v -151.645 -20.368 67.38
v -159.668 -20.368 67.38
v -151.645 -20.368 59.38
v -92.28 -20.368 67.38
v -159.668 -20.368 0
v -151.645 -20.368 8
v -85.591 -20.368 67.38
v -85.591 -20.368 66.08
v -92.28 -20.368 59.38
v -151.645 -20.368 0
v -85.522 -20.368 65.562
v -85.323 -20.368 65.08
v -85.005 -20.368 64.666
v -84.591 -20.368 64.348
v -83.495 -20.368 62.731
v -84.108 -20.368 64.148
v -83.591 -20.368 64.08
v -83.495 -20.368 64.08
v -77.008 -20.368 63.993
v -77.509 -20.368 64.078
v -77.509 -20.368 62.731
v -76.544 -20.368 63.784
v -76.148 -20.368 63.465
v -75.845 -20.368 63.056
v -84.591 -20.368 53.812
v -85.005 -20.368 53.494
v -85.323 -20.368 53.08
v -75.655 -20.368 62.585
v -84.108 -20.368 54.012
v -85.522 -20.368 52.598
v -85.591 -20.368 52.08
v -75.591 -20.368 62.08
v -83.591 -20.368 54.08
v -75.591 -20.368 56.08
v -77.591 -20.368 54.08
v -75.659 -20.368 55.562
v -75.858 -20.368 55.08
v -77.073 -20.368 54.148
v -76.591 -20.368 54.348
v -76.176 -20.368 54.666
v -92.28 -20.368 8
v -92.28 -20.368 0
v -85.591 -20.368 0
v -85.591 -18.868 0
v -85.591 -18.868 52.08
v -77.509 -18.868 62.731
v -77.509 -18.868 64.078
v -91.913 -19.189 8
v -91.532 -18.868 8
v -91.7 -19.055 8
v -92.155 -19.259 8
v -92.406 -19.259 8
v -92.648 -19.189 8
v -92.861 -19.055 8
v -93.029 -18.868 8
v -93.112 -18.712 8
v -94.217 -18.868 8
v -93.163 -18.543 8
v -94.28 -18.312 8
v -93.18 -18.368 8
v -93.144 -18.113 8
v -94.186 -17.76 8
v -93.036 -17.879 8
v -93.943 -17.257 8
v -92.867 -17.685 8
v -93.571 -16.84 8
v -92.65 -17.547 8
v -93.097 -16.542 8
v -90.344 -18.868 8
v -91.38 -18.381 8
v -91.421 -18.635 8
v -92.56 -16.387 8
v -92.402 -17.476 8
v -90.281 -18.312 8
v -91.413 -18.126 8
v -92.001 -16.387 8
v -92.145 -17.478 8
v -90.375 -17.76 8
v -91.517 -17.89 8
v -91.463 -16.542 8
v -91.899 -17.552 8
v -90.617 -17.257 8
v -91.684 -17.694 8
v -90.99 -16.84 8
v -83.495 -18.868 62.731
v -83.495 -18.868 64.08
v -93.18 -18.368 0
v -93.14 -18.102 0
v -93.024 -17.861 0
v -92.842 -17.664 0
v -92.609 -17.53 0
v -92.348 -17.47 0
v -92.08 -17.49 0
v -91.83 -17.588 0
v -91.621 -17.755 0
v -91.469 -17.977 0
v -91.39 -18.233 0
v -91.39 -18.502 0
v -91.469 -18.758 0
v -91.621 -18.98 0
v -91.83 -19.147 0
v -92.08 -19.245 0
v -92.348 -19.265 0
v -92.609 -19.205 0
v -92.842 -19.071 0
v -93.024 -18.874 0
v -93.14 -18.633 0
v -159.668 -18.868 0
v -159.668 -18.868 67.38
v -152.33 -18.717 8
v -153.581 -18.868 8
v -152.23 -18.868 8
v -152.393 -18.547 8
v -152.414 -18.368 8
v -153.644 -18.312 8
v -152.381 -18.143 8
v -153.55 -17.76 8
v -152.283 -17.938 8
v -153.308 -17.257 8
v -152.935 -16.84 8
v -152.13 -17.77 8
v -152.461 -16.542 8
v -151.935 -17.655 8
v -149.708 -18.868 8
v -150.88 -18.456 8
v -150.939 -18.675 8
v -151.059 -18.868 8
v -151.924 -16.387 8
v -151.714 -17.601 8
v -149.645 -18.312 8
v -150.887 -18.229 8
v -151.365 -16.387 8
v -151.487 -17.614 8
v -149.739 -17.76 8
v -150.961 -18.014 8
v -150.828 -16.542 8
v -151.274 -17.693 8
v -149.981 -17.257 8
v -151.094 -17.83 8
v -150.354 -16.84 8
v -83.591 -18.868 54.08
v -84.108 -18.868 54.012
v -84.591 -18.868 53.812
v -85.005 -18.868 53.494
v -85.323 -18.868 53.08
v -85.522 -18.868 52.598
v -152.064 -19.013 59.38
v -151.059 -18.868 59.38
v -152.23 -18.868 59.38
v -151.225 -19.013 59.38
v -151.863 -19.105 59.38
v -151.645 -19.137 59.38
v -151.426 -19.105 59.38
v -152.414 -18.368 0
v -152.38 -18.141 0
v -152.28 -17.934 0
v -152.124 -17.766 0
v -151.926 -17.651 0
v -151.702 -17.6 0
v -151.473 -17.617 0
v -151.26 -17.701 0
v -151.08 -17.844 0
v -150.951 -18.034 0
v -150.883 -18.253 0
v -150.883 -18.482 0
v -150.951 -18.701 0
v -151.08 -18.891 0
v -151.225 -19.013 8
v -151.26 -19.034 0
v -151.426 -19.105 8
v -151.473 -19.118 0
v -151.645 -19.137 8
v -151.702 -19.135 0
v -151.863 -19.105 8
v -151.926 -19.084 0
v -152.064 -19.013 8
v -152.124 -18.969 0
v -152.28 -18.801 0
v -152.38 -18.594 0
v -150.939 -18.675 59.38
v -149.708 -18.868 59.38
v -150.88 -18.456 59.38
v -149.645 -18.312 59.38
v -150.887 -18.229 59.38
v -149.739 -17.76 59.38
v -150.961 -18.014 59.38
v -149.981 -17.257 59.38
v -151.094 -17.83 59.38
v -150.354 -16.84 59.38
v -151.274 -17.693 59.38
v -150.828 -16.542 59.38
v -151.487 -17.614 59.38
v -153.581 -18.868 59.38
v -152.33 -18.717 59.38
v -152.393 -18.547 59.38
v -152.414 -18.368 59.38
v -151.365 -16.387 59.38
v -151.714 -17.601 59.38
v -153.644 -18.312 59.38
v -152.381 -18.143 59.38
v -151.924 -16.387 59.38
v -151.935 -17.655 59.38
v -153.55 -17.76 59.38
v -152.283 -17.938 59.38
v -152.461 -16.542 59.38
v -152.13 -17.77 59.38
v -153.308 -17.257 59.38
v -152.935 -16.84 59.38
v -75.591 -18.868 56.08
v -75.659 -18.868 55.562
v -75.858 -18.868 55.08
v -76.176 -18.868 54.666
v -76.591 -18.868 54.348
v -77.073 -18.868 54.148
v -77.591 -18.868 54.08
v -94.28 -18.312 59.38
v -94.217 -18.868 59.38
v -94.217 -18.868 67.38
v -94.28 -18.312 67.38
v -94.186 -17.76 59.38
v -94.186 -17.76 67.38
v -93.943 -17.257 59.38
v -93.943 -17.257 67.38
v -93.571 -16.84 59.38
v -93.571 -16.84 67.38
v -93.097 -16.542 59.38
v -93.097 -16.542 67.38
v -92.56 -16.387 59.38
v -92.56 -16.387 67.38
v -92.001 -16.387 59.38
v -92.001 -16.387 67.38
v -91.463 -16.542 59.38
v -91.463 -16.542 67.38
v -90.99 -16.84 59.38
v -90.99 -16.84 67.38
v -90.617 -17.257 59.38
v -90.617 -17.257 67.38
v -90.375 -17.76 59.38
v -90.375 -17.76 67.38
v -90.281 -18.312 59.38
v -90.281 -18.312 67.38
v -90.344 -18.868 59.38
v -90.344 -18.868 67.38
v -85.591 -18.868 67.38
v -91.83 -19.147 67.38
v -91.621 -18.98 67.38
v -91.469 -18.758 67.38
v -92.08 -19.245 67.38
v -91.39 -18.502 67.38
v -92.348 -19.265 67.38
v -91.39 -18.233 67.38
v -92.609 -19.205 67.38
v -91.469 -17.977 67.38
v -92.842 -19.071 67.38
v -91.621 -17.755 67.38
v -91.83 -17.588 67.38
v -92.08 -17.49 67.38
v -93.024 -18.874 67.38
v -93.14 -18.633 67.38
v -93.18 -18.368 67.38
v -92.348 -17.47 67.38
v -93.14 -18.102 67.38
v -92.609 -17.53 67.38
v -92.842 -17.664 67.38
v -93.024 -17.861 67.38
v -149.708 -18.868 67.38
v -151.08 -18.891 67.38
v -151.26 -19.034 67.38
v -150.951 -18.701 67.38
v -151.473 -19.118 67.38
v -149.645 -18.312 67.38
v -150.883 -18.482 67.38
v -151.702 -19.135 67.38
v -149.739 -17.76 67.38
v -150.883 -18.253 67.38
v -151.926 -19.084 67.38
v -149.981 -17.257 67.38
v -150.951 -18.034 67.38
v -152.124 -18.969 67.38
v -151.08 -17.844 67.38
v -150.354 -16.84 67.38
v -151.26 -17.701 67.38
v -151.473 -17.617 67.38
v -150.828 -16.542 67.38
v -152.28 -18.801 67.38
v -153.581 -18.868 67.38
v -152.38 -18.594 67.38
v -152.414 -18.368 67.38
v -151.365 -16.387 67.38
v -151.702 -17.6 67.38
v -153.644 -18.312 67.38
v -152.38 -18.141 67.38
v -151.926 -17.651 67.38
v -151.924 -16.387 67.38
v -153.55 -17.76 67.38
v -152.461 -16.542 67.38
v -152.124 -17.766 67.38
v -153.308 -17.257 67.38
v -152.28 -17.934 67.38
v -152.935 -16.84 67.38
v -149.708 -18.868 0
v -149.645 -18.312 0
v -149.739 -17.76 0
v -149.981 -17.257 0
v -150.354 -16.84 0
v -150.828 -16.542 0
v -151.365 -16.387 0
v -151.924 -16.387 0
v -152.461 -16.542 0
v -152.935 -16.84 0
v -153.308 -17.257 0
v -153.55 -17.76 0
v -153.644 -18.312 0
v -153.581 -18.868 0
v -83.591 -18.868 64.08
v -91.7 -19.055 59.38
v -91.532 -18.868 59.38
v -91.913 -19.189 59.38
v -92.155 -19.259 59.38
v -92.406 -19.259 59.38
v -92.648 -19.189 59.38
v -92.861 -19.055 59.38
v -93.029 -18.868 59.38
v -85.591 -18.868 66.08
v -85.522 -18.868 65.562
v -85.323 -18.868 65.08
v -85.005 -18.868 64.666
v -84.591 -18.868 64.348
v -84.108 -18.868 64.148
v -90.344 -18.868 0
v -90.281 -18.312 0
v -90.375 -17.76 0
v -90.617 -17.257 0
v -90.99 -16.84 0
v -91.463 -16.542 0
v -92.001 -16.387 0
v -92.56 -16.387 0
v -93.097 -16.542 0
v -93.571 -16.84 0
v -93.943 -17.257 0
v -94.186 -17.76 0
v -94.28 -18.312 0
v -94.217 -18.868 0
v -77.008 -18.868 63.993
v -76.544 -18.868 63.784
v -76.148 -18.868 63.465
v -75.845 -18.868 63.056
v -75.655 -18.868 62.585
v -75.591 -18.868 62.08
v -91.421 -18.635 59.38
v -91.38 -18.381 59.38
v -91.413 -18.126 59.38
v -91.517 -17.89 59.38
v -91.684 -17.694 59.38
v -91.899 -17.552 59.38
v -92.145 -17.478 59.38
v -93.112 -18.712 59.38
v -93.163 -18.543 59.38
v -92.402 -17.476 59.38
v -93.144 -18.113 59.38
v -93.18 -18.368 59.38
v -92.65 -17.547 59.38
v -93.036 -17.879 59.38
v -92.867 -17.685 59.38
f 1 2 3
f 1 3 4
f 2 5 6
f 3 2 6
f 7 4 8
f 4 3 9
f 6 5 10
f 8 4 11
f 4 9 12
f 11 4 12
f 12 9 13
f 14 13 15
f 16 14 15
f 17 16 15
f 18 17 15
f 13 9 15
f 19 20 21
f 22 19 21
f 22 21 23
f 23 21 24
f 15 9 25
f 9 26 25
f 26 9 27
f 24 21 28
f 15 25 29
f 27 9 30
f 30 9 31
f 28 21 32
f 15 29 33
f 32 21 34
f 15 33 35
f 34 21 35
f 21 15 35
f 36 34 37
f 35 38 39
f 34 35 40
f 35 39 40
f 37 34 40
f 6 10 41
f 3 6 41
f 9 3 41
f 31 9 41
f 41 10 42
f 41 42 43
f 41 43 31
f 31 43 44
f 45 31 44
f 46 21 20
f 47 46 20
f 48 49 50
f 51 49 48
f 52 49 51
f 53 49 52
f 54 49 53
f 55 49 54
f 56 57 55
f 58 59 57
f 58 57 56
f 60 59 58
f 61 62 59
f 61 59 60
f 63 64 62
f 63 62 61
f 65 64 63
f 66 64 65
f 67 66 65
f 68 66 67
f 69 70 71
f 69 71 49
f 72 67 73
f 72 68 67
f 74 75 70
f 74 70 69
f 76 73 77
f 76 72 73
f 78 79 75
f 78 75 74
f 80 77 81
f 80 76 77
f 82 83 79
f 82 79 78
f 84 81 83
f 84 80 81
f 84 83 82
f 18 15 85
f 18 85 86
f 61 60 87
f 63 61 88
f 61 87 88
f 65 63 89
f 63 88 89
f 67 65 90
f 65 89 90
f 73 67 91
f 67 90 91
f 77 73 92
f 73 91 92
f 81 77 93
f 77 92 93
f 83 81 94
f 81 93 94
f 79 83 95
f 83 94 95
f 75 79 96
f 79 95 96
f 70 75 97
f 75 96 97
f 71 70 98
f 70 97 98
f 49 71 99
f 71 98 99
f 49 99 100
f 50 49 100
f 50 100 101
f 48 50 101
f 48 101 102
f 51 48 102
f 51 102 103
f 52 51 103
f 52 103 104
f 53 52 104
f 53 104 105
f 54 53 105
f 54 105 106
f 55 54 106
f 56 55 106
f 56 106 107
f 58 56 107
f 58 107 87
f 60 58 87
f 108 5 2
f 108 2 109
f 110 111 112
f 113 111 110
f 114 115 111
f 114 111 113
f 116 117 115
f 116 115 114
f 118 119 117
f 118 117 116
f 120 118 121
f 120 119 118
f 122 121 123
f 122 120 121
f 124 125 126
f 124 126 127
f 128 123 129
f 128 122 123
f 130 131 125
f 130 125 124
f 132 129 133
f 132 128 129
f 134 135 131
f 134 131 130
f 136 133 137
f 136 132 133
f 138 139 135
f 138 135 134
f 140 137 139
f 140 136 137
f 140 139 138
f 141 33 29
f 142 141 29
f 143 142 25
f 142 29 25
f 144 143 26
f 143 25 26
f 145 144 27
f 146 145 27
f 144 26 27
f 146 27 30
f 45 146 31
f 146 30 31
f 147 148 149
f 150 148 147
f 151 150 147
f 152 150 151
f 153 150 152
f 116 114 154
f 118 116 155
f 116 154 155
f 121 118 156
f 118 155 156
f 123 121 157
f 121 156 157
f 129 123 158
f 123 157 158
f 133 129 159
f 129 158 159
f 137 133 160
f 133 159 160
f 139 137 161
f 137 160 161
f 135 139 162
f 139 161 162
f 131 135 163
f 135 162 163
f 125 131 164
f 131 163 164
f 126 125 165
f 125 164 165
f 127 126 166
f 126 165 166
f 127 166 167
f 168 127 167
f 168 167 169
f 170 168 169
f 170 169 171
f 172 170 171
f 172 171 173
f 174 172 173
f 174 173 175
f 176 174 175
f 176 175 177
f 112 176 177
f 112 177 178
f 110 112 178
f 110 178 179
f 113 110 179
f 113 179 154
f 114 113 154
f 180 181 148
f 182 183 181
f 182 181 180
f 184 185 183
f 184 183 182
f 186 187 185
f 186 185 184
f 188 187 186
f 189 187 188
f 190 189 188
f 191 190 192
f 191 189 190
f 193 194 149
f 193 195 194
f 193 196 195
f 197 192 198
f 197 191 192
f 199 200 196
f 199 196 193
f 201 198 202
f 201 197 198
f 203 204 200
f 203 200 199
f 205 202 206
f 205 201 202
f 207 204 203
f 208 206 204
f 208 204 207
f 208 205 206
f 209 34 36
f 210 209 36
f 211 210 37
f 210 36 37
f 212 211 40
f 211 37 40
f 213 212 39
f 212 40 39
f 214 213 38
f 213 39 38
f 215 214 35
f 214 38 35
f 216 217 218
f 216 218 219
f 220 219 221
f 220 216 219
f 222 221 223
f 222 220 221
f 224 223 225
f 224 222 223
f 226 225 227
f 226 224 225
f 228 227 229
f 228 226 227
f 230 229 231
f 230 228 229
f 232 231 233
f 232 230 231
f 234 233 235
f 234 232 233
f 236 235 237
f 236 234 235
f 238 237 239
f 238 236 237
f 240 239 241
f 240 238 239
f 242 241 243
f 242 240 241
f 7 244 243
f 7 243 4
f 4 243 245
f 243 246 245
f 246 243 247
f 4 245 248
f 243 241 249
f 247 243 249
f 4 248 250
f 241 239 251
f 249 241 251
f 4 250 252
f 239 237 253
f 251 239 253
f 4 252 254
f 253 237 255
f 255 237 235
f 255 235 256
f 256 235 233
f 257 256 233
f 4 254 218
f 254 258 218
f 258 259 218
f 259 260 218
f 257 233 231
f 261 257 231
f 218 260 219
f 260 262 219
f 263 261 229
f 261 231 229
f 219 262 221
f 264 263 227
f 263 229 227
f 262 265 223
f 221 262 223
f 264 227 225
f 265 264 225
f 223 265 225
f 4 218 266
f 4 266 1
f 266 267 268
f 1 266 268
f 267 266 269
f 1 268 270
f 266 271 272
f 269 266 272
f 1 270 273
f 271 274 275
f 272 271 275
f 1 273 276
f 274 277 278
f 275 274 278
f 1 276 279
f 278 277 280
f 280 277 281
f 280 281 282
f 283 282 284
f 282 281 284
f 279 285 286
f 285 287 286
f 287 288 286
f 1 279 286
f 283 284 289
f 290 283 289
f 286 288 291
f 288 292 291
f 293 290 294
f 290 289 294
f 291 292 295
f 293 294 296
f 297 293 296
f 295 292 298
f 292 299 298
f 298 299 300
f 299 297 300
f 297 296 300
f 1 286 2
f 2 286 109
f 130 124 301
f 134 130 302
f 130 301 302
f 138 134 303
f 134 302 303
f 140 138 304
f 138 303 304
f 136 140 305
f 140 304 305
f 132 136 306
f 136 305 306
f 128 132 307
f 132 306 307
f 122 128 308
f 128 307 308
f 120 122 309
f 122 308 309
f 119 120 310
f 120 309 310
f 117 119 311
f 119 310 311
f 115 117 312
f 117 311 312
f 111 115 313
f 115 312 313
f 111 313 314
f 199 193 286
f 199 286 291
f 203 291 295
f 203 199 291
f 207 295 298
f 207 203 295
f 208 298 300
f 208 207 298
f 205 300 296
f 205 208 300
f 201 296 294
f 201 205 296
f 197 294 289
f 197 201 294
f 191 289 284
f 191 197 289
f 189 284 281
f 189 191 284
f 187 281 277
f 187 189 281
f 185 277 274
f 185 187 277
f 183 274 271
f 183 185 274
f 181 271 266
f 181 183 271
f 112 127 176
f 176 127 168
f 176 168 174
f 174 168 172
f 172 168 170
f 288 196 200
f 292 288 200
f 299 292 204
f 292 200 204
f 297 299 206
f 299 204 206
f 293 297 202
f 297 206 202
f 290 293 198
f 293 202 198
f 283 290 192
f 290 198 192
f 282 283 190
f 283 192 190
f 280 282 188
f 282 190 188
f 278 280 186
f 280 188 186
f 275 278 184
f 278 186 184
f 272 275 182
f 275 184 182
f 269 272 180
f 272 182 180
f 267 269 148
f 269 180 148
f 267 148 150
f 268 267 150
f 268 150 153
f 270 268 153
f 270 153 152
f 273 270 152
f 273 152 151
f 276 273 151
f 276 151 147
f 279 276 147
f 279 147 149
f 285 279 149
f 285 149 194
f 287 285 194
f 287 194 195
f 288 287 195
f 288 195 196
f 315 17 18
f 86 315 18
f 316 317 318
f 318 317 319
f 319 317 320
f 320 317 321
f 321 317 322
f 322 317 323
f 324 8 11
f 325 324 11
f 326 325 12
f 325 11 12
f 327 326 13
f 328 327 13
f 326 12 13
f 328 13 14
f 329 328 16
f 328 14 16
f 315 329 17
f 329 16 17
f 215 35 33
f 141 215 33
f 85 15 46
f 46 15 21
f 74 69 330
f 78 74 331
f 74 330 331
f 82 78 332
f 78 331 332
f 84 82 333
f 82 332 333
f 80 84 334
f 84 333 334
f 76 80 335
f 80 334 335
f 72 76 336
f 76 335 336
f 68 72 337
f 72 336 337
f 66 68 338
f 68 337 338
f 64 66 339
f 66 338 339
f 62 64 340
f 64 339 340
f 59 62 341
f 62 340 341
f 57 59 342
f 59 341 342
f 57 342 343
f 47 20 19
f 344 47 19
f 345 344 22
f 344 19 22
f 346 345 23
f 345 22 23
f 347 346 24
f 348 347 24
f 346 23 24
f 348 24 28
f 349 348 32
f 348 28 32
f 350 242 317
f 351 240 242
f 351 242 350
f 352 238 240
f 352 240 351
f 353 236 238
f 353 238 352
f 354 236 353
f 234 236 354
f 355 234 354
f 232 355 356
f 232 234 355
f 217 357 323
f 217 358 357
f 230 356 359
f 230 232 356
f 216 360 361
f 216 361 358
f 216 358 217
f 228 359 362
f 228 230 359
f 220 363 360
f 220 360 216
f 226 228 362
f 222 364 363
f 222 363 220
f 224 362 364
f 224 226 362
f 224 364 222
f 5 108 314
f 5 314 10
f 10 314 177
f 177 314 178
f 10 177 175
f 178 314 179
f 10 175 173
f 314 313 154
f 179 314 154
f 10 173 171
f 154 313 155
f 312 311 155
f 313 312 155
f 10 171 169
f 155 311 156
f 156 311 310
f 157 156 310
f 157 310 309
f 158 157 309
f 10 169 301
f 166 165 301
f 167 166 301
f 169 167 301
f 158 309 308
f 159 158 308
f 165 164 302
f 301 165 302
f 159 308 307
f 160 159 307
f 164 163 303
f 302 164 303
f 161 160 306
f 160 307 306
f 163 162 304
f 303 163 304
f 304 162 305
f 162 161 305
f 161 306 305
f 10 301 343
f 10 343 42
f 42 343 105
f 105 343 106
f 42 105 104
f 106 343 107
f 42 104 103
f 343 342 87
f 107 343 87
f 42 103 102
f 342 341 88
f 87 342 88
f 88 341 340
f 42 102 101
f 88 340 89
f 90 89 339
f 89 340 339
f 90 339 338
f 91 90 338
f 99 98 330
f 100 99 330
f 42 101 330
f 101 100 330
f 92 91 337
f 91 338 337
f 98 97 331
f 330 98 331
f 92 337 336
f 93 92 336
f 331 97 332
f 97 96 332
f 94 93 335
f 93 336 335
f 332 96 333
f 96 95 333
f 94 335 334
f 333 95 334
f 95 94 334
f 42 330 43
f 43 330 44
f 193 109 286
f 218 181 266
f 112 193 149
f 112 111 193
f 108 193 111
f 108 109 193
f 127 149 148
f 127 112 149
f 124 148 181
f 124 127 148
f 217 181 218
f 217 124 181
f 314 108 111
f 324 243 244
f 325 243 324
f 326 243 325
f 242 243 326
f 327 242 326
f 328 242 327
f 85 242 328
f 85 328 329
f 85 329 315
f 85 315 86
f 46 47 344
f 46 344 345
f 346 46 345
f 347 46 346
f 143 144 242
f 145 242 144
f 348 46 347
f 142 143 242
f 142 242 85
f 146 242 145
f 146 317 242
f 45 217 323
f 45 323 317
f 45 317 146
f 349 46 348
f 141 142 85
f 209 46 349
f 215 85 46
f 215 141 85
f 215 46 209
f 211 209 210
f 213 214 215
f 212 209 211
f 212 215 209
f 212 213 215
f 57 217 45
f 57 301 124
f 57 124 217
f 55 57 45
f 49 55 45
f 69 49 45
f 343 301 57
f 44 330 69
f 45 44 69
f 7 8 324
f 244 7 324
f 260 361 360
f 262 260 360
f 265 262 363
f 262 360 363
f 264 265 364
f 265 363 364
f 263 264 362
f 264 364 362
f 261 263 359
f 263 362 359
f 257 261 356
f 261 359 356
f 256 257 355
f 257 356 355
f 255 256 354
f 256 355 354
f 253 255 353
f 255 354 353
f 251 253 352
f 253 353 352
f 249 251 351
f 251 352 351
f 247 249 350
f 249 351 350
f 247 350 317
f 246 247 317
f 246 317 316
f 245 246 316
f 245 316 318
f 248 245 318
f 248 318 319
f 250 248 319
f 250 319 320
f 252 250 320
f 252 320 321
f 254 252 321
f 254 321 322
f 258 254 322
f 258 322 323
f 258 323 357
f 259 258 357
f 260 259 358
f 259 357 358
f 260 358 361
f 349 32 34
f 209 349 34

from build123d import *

# Parameters (mm, degrees)
SKETCH1_W             = 74.077377751
SKETCH1_H             = 1.5
BOSS_EXTRUDE1_DEPTH   = 67.38
SKETCH2_R             = 2
BOSS_EXTRUDE2_DEPTH   = 8
SKETCH3_R             = 0.769644957
SKETCH3_R_2           = 0.9
CUT_EXTRUDE1_DEPTH    = 8
BOSS_EXTRUDE3_START   = 8
SKETCH4_R             = 2
BOSS_EXTRUDE3_DEPTH   = 8
SKETCH5_R             = 0.9
SKETCH5_R_2           = 0.769644957
CUT_EXTRUDE2_DEPTH    = 8
BOSS_EXTRUDE4_START   = -20.367507575
BOSS_EXTRUDE4_DEPTH   = 1.5
BOSS_EXTRUDE4_START_2 = 64.08
BOSS_EXTRUDE4_2_DEPTH = 1.5
SKETCH7_W             = 5.986172604
SKETCH7_H             = 3.921086245
CUT_EXTRUDE4_DEPTH    = 174.349085042


with BuildPart() as part:
    # Sketch1 → Boss-Extrude1 (new body)
    with BuildSketch(Plane.XY):
        with Locations((-122.62921925, -19.617507575)):
            Rectangle(SKETCH1_W, SKETCH1_H)
    extrude(amount=BOSS_EXTRUDE1_DEPTH)

    # Sketch2 → Boss-Extrude2 (add)
    with BuildSketch(Plane.XY):
        with Locations((-151.644507933, -18.367507575)):
            Circle(SKETCH2_R)
        with Locations((-92.280362099, -18.367507575)):
            Circle(SKETCH2_R)
    extrude(amount=BOSS_EXTRUDE2_DEPTH)

    # Sketch3 → Cut-Extrude1 (cut)
    with BuildSketch(Plane(origin=(0, 0, 0), x_dir=(-1, 0, 0), z_dir=(0, 0, -1))):
        with Locations((151.644507933, -18.367507575)):
            Circle(SKETCH3_R)
        with Locations((92.280362099, -18.367507575)):
            Circle(SKETCH3_R_2)
    extrude(amount=-CUT_EXTRUDE1_DEPTH, mode=Mode.SUBTRACT)

    # Sketch4 → Boss-Extrude3 (add)
    with BuildSketch(Plane(origin=(0, 0, 67.38), x_dir=(-1, 0, 0), z_dir=(0, 0, -1)).offset(BOSS_EXTRUDE3_START)):
        with Locations((151.644507933, -18.367507575)):
            Circle(SKETCH4_R)
        with Locations((92.280362099, -18.367507575)):
            Circle(SKETCH4_R)
    extrude(amount=-BOSS_EXTRUDE3_DEPTH)

    # Sketch5 → Cut-Extrude2 (cut)
    with BuildSketch(Plane(origin=(0, 0, 59.38), x_dir=(-1, 0, 0), z_dir=(0, 0, -1))):
        with Locations((92.280362099, -18.367507575)):
            Circle(SKETCH5_R)
        with Locations((151.644507933, -18.367507575)):
            Circle(SKETCH5_R_2)
    extrude(amount=-CUT_EXTRUDE2_DEPTH, mode=Mode.SUBTRACT)

    # Boss-Extrude4: read off the stored shape, not the designer's step
    # Boss-Extrude4 outline → Boss-Extrude4 (add)
    with BuildSketch(Plane(origin=(0, 0, 0), x_dir=(1, 0, 0), z_dir=(0, 1, 0)).offset(BOSS_EXTRUDE4_START)):
        with BuildLine():
            ThreePointArc((-85.590530374, -66.08), (-85.004743937, -64.665786437), (-83.590530374, -64.08))
            Line((-83.590530374, -64.08), (-77.590530374, -64.08))
            ThreePointArc((-77.590530374, -64.08), (-76.176316812, -63.494213562), (-75.590530374, -62.08))
            Line((-75.590530374, -62.08), (-75.590530374, -56.08))
            ThreePointArc((-75.590530374, -56.08), (-76.176316812, -54.665786438), (-77.590530374, -54.08))
            Line((-77.590530374, -54.08), (-83.590530374, -54.08))
            ThreePointArc((-83.590530374, -54.08), (-85.004743937, -53.494213563), (-85.590530374, -52.08))
            Line((-85.590530374, -52.08), (-85.590530374, -66.08))
        make_face()
    extrude(amount=BOSS_EXTRUDE4_DEPTH)

    # Boss-Extrude4 2 outline → Boss-Extrude4 2 (add)
    with BuildSketch(Plane.XY.offset(BOSS_EXTRUDE4_START_2)):
        Polygon((-79.170711658, -18.867507575), (-82.010469997, -18.867507575), (-80.595461682, -19.68726796), align=None)
    extrude(amount=BOSS_EXTRUDE4_2_DEPTH)

    # Sketch7 → Cut-Extrude4 (cut, through all)
    with BuildSketch(Plane.XZ.offset(20.367507575)):
        with Locations((-80.502378911, 64.691696103)):
            Rectangle(SKETCH7_W, SKETCH7_H)
    extrude(amount=-CUT_EXTRUDE4_DEPTH, mode=Mode.SUBTRACT)


solid = part.part
